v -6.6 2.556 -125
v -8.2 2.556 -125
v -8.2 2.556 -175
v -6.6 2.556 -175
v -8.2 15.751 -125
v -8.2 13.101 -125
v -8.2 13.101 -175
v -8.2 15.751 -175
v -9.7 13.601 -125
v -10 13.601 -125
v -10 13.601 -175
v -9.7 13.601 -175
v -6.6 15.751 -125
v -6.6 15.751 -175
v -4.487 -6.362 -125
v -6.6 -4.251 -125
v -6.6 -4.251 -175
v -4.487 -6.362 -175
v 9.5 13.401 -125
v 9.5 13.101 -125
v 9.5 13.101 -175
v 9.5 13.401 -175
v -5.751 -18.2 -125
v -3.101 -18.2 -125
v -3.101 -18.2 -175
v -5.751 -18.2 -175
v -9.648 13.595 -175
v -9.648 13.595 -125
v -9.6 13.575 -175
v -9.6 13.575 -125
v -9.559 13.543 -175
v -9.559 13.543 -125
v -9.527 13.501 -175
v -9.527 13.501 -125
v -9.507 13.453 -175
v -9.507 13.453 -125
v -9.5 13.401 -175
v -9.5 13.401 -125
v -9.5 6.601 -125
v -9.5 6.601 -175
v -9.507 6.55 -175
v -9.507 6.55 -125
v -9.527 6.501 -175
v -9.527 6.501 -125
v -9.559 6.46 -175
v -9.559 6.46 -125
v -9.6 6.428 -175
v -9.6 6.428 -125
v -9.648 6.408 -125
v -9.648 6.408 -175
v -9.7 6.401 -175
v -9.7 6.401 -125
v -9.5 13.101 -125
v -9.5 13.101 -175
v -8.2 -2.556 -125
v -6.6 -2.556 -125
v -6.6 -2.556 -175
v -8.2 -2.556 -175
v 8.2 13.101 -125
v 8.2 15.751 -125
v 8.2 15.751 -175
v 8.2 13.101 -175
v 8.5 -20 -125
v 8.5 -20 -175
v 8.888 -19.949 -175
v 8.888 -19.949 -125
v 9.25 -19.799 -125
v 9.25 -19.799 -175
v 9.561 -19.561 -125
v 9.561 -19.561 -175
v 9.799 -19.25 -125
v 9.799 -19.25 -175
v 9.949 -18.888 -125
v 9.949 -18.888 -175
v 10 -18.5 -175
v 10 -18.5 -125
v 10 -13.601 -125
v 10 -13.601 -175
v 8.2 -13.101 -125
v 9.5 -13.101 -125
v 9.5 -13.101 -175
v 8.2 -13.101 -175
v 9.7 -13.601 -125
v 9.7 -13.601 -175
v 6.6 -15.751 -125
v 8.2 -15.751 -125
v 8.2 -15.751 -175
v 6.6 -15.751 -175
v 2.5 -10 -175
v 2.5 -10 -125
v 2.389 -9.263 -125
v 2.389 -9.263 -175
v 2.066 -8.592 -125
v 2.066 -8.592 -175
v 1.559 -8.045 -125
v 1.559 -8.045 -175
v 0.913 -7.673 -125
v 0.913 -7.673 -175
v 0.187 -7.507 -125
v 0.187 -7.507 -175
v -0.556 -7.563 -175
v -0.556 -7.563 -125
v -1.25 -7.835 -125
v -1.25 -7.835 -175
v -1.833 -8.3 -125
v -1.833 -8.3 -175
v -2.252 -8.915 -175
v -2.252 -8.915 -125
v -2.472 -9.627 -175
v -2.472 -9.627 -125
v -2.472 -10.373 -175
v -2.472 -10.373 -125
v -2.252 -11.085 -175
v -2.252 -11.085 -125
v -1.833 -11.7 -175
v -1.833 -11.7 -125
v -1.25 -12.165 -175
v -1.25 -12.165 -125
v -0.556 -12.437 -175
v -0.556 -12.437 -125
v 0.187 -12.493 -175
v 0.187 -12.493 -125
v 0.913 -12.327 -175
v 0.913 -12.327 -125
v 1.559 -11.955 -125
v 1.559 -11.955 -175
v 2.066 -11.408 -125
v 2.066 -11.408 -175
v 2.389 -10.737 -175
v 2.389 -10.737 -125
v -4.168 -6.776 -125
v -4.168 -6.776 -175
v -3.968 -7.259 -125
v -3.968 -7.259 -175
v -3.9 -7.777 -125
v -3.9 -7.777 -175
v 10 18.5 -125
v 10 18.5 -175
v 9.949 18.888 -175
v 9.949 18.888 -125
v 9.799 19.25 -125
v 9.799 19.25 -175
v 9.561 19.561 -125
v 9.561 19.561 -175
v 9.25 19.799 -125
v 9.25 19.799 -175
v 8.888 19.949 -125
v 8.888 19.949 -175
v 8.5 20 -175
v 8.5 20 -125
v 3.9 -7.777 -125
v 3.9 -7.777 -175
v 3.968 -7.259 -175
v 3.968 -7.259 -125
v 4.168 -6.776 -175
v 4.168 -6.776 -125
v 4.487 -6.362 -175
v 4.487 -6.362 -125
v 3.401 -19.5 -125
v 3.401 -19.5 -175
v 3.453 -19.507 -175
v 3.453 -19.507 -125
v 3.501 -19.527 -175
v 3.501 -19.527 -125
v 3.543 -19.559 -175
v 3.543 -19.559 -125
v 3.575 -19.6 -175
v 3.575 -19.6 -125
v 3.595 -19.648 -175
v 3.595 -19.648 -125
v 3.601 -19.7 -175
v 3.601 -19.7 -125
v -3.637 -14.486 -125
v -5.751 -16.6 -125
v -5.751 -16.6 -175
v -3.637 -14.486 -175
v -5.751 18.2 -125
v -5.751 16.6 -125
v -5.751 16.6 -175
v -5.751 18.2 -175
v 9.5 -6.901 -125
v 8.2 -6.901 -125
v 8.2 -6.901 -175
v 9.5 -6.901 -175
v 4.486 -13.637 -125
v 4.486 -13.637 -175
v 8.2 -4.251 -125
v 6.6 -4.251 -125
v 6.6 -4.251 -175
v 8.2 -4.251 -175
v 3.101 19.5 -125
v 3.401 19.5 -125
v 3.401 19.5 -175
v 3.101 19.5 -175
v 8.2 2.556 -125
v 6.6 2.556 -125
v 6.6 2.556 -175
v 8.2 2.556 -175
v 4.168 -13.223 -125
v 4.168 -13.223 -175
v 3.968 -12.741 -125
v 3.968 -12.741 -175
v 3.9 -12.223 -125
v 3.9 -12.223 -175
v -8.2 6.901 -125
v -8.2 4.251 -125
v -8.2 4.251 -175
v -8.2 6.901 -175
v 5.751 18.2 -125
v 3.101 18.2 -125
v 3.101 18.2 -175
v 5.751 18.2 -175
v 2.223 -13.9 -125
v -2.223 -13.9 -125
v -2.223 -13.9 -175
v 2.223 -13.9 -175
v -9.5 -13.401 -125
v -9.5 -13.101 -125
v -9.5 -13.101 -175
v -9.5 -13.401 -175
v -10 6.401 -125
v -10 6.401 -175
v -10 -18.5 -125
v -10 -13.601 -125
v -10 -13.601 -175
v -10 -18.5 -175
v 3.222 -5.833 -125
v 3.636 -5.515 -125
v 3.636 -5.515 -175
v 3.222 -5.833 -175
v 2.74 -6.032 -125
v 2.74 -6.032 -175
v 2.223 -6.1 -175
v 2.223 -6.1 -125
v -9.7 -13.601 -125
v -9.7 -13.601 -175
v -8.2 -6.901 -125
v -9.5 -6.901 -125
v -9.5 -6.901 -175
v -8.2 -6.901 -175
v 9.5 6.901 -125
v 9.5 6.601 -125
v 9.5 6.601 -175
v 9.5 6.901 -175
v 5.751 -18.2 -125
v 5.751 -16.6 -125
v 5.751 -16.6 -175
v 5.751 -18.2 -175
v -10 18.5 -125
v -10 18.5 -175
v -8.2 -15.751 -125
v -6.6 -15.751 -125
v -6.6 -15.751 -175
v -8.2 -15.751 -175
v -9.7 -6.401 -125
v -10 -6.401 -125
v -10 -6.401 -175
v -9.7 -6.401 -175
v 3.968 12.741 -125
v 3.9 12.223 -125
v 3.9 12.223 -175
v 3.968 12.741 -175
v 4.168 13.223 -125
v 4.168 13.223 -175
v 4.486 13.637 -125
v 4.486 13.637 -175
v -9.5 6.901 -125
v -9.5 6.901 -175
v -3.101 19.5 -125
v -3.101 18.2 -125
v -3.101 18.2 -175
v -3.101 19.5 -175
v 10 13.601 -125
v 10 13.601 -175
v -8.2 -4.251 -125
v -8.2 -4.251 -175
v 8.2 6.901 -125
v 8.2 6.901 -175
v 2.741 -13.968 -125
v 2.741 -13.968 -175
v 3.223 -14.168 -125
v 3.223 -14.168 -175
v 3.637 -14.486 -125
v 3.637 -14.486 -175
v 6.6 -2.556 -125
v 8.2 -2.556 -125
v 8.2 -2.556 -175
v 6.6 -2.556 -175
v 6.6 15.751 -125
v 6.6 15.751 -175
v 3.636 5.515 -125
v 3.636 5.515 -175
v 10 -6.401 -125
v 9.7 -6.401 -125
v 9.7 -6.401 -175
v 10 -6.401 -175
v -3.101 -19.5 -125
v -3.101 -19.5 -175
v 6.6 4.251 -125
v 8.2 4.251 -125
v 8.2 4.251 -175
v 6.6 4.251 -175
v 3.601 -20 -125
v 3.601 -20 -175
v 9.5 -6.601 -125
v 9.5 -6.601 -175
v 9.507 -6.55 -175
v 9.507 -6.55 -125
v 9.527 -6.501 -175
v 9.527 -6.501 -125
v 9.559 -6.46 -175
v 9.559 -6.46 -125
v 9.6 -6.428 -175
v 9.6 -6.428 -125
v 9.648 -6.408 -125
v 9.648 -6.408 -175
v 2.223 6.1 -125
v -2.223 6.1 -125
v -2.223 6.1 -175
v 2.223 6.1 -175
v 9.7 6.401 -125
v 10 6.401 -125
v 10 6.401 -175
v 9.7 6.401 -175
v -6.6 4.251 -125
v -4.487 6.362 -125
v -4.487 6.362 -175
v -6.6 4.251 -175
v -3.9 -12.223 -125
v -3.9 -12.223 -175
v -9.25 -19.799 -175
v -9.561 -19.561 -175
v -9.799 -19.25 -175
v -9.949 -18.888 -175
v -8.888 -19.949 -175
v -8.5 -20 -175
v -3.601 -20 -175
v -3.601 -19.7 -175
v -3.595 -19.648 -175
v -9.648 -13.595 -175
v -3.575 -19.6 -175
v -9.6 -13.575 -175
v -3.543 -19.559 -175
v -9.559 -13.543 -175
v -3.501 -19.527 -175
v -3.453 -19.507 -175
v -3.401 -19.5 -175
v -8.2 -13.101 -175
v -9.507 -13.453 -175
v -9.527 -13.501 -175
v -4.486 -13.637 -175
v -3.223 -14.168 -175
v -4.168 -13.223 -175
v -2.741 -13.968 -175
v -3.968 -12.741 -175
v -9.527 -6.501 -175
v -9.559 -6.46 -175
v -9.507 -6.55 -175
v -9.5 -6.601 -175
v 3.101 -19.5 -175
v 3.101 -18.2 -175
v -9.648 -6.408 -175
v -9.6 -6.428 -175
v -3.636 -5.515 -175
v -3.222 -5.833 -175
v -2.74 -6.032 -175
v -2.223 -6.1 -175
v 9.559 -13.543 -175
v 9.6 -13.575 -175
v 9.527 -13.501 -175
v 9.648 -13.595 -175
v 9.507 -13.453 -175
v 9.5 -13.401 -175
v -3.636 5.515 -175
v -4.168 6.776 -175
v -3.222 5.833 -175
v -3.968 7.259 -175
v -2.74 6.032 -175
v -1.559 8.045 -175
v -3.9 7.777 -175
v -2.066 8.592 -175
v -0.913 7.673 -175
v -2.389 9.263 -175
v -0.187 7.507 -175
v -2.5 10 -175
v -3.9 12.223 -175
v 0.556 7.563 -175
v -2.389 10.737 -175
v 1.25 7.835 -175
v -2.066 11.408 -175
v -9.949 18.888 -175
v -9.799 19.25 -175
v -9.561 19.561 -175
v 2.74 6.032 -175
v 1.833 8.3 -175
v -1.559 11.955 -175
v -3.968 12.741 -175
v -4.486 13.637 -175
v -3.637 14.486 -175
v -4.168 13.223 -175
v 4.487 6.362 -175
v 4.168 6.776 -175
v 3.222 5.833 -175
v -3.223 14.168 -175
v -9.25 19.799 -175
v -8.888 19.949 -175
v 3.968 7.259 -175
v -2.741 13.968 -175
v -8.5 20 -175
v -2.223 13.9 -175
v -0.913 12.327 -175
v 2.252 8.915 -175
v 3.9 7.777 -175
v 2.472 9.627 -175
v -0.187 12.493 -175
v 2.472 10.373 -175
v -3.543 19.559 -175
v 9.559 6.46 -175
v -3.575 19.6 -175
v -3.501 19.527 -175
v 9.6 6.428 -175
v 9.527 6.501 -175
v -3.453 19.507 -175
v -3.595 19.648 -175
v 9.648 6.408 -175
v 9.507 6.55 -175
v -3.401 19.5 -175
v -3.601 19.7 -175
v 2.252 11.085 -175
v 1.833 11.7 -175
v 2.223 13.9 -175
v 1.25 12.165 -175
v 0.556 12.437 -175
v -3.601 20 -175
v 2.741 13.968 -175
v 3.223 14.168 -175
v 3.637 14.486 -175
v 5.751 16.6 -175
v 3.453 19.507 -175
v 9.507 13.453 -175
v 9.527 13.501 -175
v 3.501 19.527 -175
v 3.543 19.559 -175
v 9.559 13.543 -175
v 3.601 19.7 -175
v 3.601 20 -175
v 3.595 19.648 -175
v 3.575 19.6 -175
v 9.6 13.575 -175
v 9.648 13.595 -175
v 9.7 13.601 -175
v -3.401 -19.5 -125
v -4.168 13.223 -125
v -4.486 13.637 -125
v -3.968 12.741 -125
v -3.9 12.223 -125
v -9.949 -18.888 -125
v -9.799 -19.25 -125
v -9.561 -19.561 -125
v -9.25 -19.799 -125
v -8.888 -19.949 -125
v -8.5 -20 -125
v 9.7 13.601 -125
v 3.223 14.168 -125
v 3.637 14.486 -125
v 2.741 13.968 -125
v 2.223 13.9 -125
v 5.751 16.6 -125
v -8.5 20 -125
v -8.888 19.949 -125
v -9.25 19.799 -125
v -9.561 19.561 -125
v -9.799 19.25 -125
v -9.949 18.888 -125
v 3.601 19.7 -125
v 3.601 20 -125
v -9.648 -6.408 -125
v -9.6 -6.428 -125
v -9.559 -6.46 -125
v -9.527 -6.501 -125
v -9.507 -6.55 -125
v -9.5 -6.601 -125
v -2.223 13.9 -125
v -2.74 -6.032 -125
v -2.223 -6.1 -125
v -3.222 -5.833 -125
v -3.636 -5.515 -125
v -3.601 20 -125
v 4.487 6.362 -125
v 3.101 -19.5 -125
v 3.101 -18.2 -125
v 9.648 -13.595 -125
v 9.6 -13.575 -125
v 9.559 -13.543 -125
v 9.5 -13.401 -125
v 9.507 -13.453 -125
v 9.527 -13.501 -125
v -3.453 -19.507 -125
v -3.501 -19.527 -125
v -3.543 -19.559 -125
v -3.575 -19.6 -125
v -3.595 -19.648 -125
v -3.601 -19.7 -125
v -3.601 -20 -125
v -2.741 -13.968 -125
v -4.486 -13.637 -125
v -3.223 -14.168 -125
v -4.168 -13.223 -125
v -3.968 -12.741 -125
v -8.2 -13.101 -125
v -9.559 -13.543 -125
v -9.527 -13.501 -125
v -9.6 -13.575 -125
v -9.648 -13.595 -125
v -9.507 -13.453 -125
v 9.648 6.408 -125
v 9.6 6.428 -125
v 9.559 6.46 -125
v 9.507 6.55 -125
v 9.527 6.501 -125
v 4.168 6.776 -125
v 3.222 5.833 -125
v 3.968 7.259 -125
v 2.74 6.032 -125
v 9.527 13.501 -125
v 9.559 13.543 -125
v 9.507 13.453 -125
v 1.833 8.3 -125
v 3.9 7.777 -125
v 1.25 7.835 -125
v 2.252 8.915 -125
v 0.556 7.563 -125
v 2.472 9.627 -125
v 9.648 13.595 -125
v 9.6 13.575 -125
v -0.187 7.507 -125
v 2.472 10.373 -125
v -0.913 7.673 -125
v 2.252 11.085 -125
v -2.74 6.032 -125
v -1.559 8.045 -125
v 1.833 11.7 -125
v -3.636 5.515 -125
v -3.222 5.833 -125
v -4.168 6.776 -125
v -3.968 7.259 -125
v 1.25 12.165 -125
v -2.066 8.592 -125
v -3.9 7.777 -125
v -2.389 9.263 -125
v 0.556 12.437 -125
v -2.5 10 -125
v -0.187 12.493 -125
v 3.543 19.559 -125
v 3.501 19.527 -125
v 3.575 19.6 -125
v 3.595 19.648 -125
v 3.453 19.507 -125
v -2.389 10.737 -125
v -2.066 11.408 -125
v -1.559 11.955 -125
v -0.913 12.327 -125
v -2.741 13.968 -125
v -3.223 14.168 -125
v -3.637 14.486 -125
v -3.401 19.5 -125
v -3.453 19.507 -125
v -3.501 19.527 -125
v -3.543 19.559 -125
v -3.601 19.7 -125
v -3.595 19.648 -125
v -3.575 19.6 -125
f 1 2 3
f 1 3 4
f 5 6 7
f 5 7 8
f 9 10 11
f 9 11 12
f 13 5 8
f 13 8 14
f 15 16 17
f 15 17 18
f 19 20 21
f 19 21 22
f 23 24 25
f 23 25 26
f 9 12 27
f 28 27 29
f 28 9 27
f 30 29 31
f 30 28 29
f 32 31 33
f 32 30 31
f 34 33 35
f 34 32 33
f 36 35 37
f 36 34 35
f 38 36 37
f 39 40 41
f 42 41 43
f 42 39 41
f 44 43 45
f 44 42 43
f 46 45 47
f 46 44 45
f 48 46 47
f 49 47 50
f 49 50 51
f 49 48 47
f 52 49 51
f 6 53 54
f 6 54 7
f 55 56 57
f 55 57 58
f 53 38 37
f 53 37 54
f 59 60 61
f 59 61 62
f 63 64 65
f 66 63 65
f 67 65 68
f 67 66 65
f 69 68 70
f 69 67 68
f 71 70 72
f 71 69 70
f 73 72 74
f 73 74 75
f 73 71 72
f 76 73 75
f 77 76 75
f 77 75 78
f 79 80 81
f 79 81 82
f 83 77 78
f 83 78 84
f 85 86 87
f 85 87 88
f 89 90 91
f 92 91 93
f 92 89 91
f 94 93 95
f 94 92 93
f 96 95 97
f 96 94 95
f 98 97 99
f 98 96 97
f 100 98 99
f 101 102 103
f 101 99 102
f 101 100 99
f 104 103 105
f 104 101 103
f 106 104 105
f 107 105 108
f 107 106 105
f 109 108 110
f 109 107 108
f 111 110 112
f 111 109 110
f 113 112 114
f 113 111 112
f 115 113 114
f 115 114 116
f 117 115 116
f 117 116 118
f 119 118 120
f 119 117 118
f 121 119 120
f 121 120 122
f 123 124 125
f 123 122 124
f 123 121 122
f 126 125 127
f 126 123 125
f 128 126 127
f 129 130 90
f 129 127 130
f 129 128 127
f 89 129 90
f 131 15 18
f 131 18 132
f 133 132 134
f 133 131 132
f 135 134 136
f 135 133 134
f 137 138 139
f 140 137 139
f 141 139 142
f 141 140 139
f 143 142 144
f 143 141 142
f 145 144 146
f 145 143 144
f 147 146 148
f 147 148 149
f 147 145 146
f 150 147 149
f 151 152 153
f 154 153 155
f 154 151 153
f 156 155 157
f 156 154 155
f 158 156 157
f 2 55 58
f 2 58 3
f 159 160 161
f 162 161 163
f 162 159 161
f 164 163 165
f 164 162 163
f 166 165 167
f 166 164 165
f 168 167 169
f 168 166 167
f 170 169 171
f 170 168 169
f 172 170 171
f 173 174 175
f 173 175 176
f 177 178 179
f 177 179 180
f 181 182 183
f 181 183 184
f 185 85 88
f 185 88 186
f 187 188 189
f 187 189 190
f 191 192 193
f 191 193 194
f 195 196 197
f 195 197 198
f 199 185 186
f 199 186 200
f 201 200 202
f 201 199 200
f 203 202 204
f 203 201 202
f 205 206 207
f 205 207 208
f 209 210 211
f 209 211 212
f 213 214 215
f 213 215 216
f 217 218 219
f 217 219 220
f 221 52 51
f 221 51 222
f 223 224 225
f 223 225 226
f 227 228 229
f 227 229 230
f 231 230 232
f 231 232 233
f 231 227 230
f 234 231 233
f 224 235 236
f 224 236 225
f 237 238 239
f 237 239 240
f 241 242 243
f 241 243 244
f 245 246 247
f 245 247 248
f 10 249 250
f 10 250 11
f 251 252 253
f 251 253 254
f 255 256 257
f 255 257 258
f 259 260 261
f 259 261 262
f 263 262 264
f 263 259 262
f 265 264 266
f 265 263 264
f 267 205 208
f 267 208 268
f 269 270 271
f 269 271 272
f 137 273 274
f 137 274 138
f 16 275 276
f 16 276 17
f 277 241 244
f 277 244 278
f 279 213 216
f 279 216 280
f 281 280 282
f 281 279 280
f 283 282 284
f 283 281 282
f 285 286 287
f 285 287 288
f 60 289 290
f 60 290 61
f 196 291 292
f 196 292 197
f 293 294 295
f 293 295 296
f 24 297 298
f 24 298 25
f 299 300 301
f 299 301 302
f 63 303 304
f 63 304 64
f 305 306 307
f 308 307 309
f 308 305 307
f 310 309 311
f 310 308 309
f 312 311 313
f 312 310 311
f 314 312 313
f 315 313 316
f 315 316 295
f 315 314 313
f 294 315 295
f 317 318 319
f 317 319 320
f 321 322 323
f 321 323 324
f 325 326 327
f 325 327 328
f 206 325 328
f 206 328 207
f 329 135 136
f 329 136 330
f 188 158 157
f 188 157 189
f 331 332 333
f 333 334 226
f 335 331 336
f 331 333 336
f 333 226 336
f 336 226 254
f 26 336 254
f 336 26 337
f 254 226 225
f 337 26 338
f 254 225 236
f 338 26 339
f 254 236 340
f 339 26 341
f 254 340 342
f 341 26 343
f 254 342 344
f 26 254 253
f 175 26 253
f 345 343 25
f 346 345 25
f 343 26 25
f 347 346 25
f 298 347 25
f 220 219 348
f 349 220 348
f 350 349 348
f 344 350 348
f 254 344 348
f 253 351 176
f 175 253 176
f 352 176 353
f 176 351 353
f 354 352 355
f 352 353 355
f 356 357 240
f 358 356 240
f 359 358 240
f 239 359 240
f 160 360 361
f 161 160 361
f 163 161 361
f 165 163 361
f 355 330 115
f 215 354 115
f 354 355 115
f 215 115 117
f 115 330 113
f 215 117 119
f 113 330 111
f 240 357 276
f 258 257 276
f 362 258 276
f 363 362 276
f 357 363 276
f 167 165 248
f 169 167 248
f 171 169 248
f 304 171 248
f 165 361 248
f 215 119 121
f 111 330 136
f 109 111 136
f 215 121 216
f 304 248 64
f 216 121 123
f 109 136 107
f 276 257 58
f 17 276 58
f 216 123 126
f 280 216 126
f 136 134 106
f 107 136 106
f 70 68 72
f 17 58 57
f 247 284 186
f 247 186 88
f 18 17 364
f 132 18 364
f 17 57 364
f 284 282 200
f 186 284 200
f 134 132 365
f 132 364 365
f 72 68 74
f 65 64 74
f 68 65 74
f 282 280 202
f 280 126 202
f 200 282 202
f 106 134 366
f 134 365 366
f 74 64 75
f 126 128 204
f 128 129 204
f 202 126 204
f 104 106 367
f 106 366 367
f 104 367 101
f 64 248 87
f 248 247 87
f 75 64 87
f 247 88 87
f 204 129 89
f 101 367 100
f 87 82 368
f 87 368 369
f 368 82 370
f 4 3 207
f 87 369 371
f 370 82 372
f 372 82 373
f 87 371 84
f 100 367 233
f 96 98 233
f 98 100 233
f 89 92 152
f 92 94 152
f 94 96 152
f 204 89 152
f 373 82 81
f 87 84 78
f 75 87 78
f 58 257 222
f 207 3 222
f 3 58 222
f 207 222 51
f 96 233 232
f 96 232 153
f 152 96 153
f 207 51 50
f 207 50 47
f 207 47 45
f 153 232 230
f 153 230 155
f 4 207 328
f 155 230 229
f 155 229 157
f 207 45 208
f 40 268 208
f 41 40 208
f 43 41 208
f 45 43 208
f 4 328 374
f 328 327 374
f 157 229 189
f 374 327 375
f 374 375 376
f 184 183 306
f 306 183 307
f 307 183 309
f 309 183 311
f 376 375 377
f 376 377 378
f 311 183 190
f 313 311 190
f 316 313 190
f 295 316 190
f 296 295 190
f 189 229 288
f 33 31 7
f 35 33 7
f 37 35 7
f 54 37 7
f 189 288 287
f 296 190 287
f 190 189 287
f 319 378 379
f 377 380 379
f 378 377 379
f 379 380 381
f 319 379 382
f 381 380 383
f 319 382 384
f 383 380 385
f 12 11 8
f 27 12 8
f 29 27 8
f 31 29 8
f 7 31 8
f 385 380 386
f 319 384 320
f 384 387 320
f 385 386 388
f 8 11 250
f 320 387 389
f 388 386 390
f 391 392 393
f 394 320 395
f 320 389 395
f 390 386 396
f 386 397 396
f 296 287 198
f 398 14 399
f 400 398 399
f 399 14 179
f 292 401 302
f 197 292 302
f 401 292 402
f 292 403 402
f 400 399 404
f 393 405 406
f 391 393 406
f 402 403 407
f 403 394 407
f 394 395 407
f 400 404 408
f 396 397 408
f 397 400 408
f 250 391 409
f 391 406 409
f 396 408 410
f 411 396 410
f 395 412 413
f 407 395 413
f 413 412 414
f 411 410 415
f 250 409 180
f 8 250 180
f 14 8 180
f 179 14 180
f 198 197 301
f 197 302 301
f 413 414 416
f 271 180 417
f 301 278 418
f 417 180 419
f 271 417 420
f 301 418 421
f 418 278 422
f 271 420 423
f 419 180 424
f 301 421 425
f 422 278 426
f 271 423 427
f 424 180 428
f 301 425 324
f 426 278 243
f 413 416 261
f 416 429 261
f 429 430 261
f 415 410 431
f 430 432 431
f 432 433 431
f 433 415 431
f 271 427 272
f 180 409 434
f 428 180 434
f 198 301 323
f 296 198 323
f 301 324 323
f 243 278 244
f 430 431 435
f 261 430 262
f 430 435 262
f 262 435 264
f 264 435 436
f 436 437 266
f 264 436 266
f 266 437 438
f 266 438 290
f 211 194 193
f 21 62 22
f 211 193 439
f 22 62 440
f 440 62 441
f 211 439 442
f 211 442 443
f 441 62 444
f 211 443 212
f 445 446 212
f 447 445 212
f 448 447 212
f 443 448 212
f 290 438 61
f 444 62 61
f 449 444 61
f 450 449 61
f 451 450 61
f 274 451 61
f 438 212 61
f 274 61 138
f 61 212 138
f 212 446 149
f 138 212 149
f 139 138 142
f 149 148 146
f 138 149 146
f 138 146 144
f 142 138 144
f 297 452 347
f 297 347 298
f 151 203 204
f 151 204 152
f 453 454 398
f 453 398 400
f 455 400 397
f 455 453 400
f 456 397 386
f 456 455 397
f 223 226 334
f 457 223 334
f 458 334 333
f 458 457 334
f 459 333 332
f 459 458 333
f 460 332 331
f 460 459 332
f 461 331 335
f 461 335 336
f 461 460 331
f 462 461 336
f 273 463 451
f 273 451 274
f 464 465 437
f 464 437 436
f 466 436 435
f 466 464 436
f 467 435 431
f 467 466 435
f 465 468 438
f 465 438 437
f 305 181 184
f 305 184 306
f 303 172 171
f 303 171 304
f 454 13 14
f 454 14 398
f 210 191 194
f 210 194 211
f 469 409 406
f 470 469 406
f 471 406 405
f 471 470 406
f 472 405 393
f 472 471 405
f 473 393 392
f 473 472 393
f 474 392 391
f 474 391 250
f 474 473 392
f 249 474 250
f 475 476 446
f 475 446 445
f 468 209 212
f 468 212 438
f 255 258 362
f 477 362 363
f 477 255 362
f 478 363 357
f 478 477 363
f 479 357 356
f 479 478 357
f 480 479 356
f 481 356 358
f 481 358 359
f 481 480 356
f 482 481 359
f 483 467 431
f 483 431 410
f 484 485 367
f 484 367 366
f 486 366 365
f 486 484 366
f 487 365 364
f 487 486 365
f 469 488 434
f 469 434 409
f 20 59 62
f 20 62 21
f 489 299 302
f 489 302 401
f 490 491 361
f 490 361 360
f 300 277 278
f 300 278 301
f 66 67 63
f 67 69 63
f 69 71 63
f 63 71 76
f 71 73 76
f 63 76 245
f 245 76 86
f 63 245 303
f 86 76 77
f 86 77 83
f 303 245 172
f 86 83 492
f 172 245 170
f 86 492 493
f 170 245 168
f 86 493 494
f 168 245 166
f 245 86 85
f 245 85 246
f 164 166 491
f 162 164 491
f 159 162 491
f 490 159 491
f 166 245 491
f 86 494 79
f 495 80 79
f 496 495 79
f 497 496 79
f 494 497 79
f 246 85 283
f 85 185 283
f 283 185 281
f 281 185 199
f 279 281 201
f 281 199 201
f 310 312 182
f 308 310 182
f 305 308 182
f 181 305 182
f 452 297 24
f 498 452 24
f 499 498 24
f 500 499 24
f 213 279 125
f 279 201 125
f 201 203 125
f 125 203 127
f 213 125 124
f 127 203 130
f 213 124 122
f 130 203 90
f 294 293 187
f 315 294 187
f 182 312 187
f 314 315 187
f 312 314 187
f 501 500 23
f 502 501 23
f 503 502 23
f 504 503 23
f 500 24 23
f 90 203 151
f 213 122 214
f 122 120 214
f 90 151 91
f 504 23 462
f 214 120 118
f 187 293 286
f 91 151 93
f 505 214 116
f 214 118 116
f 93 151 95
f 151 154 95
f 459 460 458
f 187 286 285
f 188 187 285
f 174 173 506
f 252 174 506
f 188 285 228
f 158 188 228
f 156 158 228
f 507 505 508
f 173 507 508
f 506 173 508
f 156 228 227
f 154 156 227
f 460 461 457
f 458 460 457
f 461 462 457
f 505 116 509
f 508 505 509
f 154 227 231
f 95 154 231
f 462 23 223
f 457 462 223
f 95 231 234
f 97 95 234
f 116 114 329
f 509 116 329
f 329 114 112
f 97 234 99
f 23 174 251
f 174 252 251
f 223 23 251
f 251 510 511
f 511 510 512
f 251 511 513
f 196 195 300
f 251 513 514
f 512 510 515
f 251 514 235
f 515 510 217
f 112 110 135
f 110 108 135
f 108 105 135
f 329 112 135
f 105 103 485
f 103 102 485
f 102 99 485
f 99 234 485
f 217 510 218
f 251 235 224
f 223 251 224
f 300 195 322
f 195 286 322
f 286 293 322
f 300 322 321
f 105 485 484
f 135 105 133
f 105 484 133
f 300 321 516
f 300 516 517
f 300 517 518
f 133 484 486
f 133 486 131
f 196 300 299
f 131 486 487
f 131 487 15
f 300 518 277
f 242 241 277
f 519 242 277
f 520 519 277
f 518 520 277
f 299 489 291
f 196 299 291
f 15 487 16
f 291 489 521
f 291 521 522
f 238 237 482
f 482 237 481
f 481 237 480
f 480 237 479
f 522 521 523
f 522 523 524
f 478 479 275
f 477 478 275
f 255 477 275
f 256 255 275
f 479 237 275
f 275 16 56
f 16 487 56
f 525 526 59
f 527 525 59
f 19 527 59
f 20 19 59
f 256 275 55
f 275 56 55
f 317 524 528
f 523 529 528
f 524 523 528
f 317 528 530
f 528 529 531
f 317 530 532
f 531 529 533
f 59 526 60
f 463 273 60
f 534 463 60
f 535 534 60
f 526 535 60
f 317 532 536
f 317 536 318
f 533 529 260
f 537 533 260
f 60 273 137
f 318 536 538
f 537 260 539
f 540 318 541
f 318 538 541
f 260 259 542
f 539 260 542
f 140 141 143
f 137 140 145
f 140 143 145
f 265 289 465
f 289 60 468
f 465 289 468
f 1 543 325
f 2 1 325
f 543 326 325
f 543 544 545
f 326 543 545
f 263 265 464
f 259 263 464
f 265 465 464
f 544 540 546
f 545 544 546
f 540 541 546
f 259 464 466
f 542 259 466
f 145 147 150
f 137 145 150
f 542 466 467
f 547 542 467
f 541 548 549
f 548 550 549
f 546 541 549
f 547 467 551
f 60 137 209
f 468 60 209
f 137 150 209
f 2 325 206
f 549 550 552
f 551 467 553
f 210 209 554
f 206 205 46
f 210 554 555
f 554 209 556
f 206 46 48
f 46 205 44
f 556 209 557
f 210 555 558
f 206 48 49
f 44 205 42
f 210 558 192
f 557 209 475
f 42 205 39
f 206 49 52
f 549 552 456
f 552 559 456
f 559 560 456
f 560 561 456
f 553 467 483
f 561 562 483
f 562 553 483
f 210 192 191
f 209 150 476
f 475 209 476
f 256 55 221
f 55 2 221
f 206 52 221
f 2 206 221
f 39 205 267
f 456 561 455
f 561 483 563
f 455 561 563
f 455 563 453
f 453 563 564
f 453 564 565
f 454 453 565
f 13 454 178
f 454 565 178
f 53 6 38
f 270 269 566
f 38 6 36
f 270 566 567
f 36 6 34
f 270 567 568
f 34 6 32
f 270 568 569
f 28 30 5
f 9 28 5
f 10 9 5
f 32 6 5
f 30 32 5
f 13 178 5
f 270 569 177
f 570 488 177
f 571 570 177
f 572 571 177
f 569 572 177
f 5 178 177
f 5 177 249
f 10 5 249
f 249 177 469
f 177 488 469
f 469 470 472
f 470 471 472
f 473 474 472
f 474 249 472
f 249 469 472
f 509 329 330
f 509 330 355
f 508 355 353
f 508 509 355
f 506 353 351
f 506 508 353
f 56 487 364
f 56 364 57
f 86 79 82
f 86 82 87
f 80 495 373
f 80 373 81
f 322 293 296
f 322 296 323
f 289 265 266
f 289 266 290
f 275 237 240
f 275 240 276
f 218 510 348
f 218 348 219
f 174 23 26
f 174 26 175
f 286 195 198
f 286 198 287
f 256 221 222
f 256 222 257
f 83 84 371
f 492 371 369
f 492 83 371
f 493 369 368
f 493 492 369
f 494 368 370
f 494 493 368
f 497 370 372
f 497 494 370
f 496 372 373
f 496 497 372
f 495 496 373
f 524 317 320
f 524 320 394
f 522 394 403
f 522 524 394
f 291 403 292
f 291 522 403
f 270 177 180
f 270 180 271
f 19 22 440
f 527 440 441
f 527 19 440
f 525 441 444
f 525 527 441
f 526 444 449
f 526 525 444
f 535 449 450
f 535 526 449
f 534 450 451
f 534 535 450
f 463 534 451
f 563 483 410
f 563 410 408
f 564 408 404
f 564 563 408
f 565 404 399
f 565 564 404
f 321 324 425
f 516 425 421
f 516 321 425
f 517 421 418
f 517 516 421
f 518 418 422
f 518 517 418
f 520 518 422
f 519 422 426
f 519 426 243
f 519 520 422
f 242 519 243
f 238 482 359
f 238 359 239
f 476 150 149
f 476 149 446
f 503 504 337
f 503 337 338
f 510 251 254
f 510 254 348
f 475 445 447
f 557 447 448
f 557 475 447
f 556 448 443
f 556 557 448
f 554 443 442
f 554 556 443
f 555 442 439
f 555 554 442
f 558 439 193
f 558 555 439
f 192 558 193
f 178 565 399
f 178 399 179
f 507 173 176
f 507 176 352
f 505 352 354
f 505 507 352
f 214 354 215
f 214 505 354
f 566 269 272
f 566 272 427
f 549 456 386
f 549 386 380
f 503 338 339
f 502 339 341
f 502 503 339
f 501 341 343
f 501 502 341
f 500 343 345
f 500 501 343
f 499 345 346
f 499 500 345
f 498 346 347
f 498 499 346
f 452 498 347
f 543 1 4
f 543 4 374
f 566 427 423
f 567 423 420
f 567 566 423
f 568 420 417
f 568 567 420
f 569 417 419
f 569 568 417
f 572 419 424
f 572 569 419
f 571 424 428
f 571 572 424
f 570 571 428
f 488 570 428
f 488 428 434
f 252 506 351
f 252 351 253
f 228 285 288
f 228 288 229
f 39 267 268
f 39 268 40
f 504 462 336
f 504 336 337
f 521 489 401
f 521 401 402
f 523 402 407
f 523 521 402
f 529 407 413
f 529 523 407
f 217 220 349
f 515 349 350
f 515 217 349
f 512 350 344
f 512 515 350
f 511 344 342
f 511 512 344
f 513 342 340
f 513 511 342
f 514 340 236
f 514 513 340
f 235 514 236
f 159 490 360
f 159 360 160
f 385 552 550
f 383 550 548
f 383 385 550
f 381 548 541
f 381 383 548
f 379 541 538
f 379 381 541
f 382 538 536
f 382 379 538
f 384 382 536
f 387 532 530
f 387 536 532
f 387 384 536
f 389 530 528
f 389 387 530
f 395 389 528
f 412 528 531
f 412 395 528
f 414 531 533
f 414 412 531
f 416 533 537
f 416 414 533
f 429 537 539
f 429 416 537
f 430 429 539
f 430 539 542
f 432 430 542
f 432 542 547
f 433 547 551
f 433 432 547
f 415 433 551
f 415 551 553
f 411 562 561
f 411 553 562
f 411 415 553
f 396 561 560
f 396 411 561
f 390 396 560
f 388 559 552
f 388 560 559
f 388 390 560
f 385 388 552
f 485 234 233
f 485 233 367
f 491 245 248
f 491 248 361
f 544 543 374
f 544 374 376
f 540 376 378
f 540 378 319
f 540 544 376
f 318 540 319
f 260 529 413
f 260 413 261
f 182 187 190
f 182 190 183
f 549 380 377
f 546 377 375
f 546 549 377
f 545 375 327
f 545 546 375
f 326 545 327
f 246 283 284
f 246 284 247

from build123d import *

# Parameters (mm, degrees)
CROQUIS3_R              = 2.5
SALIENTE_EXTRUIR3_DEPTH = 175
SKETCH1_W               = 4.862742591
SKETCH1_H               = 300
SKETCH1_W_2             = 1.5
SKETCH1_W_3             = 0.035786438
CUT_EXTRUDE3_DEPTH      = 100


with BuildPart() as part:
    # Croquis3 → Saliente-Extruir3 (new, symmetric)
    with BuildSketch(Plane.XY):
        with BuildLine():
            Line((-9.5, -13.101470971), (-9.5, -13.401470971))
            ThreePointArc((-9.5, -13.401470971), (-9.558578644, -13.542892327), (-9.7, -13.601470971))
            Line((-9.7, -13.601470971), (-10, -13.601470971))
            Line((-10, -13.601470971), (-10, -18.5))
            ThreePointArc((-10, -18.5), (-9.560660172, -19.560660172), (-8.5, -20))
            Line((-8.5, -20), (-3.601470971, -20))
            Line((-3.601470971, -20), (-3.601470971, -19.7))
            ThreePointArc((-3.601470971, -19.7), (-3.542892327, -19.558578644), (-3.401470971, -19.5))
            Line((-3.401470971, -19.5), (-3.101470971, -19.5))
            Line((-3.101470971, -19.5), (-3.101470971, -18.2))
            Line((-3.101470971, -18.2), (-5.751470971, -18.2))
            Line((-5.751470971, -18.2), (-5.751470971, -16.6))
            Line((-5.751470971, -16.6), (-3.637257409, -14.485786438))
            ThreePointArc((-3.637257409, -14.485786438), (-2.988410711, -14.052240935), (-2.223043846, -13.9))
            Line((-2.223043846, -13.9), (2.223043846, -13.9))
            ThreePointArc((2.223043846, -13.9), (2.988410711, -14.052240935), (3.637257409, -14.485786438))
            Line((3.637257409, -14.485786438), (5.751470971, -16.6))
            Line((5.751470971, -16.6), (5.751470971, -18.2))
            Line((5.751470971, -18.2), (3.101470971, -18.2))
            Line((3.101470971, -18.2), (3.101470971, -19.5))
            Line((3.101470971, -19.5), (3.401470971, -19.5))
            ThreePointArc((3.401470971, -19.5), (3.542892327, -19.558578644), (3.601470971, -19.7))
            Line((3.601470971, -19.7), (3.601470971, -20))
            Line((3.601470971, -20), (8.5, -20))
            ThreePointArc((8.5, -20), (9.560660172, -19.560660172), (10, -18.5))
            Line((10, -18.5), (10, -13.601470971))
            Line((10, -13.601470971), (9.7, -13.601470971))
            ThreePointArc((9.7, -13.601470971), (9.558578644, -13.542892327), (9.5, -13.401470971))
            Line((9.5, -13.401470971), (9.5, -13.101470971))
            Line((9.5, -13.101470971), (8.2, -13.101470971))
            Line((8.2, -13.101470971), (8.2, -15.751470971))
            Line((8.2, -15.751470971), (6.6, -15.751470971))
            Line((6.6, -15.751470971), (4.485786438, -13.637257409))
            ThreePointArc((4.485786438, -13.637257409), (4.052240935, -12.988410711), (3.9, -12.223043846))
            Line((3.9, -12.223043846), (3.9, -7.776956154))
            ThreePointArc((3.9, -7.776956154), (4.052507548, -7.010945946), (4.486771639, -6.361758076))
            Line((4.486771639, -6.361758076), (6.6, -4.251470971))
            Line((6.6, -4.251470971), (8.2, -4.251470971))
            Line((8.2, -4.251470971), (8.2, -6.901470971))
            Line((8.2, -6.901470971), (9.5, -6.901470971))
            Line((9.5, -6.901470971), (9.5, -6.601470971))
            ThreePointArc((9.5, -6.601470971), (9.558578644, -6.460049615), (9.7, -6.401470971))
            Line((9.7, -6.401470971), (10, -6.401470971))
            Line((10, -6.401470971), (10, 6.401470971))
            Line((10, 6.401470971), (9.7, 6.401470971))
            ThreePointArc((9.7, 6.401470971), (9.558578644, 6.460049615), (9.5, 6.601470971))
            Line((9.5, 6.601470971), (9.5, 6.901470971))
            Line((9.5, 6.901470971), (8.2, 6.901470971))
            Line((8.2, 6.901470971), (8.2, 4.251470971))
            Line((8.2, 4.251470971), (6.6, 4.251470971))
            Line((6.6, 4.251470971), (4.486771639, 6.361758076))
            ThreePointArc((4.486771639, 6.361758076), (4.052507548, 7.010945946), (3.9, 7.776956154))
            Line((3.9, 7.776956154), (3.9, 12.223043846))
            ThreePointArc((3.9, 12.223043846), (4.052240935, 12.988410711), (4.485786438, 13.637257409))
            Line((4.485786438, 13.637257409), (6.6, 15.751470971))
            Line((6.6, 15.751470971), (8.2, 15.751470971))
            Line((8.2, 15.751470971), (8.2, 13.101470971))
            Line((8.2, 13.101470971), (9.5, 13.101470971))
            Line((9.5, 13.101470971), (9.5, 13.401470971))
            ThreePointArc((9.5, 13.401470971), (9.558578644, 13.542892327), (9.7, 13.601470971))
            Line((9.7, 13.601470971), (10, 13.601470971))
            Line((10, 13.601470971), (10, 18.5))
            ThreePointArc((10, 18.5), (9.560660172, 19.560660172), (8.5, 20))
            Line((8.5, 20), (3.601470971, 20))
            Line((3.601470971, 20), (3.601470971, 19.7))
            ThreePointArc((3.601470971, 19.7), (3.542892327, 19.558578644), (3.401470971, 19.5))
            Line((3.401470971, 19.5), (3.101470971, 19.5))
            Line((3.101470971, 19.5), (3.101470971, 18.2))
            Line((3.101470971, 18.2), (5.751470971, 18.2))
            Line((5.751470971, 18.2), (5.751470971, 16.6))
            Line((5.751470971, 16.6), (3.637257409, 14.485786438))
            ThreePointArc((3.637257409, 14.485786438), (2.988410711, 14.052240935), (2.223043846, 13.9))
            Line((2.223043846, 13.9), (-2.223043846, 13.9))
            ThreePointArc((-2.223043846, 13.9), (-2.988410711, 14.052240935), (-3.637257409, 14.485786438))
            Line((-3.637257409, 14.485786438), (-5.751470971, 16.6))
            Line((-5.751470971, 16.6), (-5.751470971, 18.2))
            Line((-5.751470971, 18.2), (-3.101470971, 18.2))
            Line((-3.101470971, 18.2), (-3.101470971, 19.5))
            Line((-3.101470971, 19.5), (-3.401470971, 19.5))
            ThreePointArc((-3.401470971, 19.5), (-3.542892327, 19.558578644), (-3.601470971, 19.7))
            Line((-3.601470971, 19.7), (-3.601470971, 20))
            Line((-3.601470971, 20), (-8.5, 20))
            ThreePointArc((-8.5, 20), (-9.560660172, 19.560660172), (-10, 18.5))
            Line((-10, 18.5), (-10, 13.601470971))
            Line((-10, 13.601470971), (-9.7, 13.601470971))
            ThreePointArc((-9.7, 13.601470971), (-9.558578644, 13.542892327), (-9.5, 13.401470971))
            Line((-9.5, 13.401470971), (-9.5, 13.101470971))
            Line((-9.5, 13.101470971), (-8.2, 13.101470971))
            Line((-8.2, 13.101470971), (-8.2, 15.751470971))
            Line((-8.2, 15.751470971), (-6.6, 15.751470971))
            Line((-6.6, 15.751470971), (-4.485786438, 13.637257409))
            ThreePointArc((-4.485786438, 13.637257409), (-4.052240935, 12.988410711), (-3.9, 12.223043846))
            Line((-3.9, 12.223043846), (-3.9, 7.776956154))
            ThreePointArc((-3.9, 7.776956154), (-4.052507548, 7.010945946), (-4.486771639, 6.361758076))
            Line((-4.486771639, 6.361758076), (-6.6, 4.251470971))
            Line((-6.6, 4.251470971), (-8.2, 4.251470971))
            Line((-8.2, 4.251470971), (-8.2, 6.901470971))
            Line((-8.2, 6.901470971), (-9.5, 6.901470971))
            Line((-9.5, 6.901470971), (-9.5, 6.601470971))
            ThreePointArc((-9.5, 6.601470971), (-9.558578644, 6.460049615), (-9.7, 6.401470971))
            Line((-9.7, 6.401470971), (-10, 6.401470971))
            Line((-10, 6.401470971), (-10, -6.401470971))
            Line((-10, -6.401470971), (-9.7, -6.401470971))
            ThreePointArc((-9.7, -6.401470971), (-9.558578644, -6.460049615), (-9.5, -6.601470971))
            Line((-9.5, -6.601470971), (-9.5, -6.901470971))
            Line((-9.5, -6.901470971), (-8.2, -6.901470971))
            Line((-8.2, -6.901470971), (-8.2, -4.251470971))
            Line((-8.2, -4.251470971), (-6.6, -4.251470971))
            Line((-6.6, -4.251470971), (-4.486771639, -6.361758076))
            ThreePointArc((-4.486771639, -6.361758076), (-4.052507548, -7.010945946), (-3.9, -7.776956154))
            Line((-3.9, -7.776956154), (-3.9, -12.223043846))
            ThreePointArc((-3.9, -12.223043846), (-4.052240935, -12.988410711), (-4.485786438, -13.637257409))
            Line((-4.485786438, -13.637257409), (-6.6, -15.751470971))
            Line((-6.6, -15.751470971), (-8.2, -15.751470971))
            Line((-8.2, -15.751470971), (-8.2, -13.101470971))
            Line((-8.2, -13.101470971), (-9.5, -13.101470971))
        make_face()
        with Locations((0, -10)):
            Circle(CROQUIS3_R, mode=Mode.SUBTRACT)
        with Locations(Location((0, 10, 0), (0, 0, 180))):
            Circle(CROQUIS3_R, mode=Mode.SUBTRACT)
        with BuildLine():
            Line((-3.636272208, -5.515198077), (-6.6, -2.555595292))
            Line((-6.6, -2.555595292), (-8.2, -2.555595292))
            Line((-8.2, -2.555595292), (-8.2, 2.555595292))
            Line((-8.2, 2.555595292), (-6.6, 2.555595292))
            Line((-6.6, 2.555595292), (-3.636272208, 5.515198077))
            ThreePointArc((-3.636272208, 5.515198077), (-2.987767275, 5.948025454), (-2.223043846, 6.1))
            Line((-2.223043846, 6.1), (2.223043846, 6.1))
            ThreePointArc((2.223043846, 6.1), (2.987767275, 5.948025454), (3.636272208, 5.515198077))
            Line((3.636272208, 5.515198077), (6.6, 2.555595292))
            Line((6.6, 2.555595292), (8.2, 2.555595292))
            Line((8.2, 2.555595292), (8.2, -2.555595292))
            Line((8.2, -2.555595292), (6.6, -2.555595292))
            Line((6.6, -2.555595292), (3.636272208, -5.515198077))
            ThreePointArc((3.636272208, -5.515198077), (2.987767275, -5.948025454), (2.223043846, -6.1))
            Line((2.223043846, -6.1), (-2.223043846, -6.1))
            ThreePointArc((-2.223043846, -6.1), (-2.987767275, -5.948025454), (-3.636272208, -5.515198077))
        make_face(mode=Mode.SUBTRACT)
    extrude(amount=SALIENTE_EXTRUIR3_DEPTH, both=True)

    # Sketch1 → Cut-Extrude3 (cut)
    with BuildSketch(Plane(origin=(0, 20, 0), x_dir=(1, 0, 0), z_dir=(0, 1, 0))):
        Polygon((3.637257409, -175), (8.5, -175), (10, -175), (10, 125), (3.637257409, 125), align=None)
        Polygon((2.223043846, -175), (3.601470971, -175), (3.601470971, 125), (-3.601470971, 125), (-3.601470971, -175), (-2.223043846, -175), align=None)
        with Locations((-6.068628705, -25)):
            Rectangle(SKETCH1_W, SKETCH1_H)
        with Locations((-9.25, -25)):
            Rectangle(SKETCH1_W_2, SKETCH1_H)
        with Locations((-3.61936419, -25)):
            Rectangle(SKETCH1_W_3, SKETCH1_H)
        with Locations((3.61936419, -25)):
            Rectangle(SKETCH1_W_3, SKETCH1_H)
    extrude(amount=-CUT_EXTRUDE3_DEPTH, mode=Mode.SUBTRACT)


solid = part.part
